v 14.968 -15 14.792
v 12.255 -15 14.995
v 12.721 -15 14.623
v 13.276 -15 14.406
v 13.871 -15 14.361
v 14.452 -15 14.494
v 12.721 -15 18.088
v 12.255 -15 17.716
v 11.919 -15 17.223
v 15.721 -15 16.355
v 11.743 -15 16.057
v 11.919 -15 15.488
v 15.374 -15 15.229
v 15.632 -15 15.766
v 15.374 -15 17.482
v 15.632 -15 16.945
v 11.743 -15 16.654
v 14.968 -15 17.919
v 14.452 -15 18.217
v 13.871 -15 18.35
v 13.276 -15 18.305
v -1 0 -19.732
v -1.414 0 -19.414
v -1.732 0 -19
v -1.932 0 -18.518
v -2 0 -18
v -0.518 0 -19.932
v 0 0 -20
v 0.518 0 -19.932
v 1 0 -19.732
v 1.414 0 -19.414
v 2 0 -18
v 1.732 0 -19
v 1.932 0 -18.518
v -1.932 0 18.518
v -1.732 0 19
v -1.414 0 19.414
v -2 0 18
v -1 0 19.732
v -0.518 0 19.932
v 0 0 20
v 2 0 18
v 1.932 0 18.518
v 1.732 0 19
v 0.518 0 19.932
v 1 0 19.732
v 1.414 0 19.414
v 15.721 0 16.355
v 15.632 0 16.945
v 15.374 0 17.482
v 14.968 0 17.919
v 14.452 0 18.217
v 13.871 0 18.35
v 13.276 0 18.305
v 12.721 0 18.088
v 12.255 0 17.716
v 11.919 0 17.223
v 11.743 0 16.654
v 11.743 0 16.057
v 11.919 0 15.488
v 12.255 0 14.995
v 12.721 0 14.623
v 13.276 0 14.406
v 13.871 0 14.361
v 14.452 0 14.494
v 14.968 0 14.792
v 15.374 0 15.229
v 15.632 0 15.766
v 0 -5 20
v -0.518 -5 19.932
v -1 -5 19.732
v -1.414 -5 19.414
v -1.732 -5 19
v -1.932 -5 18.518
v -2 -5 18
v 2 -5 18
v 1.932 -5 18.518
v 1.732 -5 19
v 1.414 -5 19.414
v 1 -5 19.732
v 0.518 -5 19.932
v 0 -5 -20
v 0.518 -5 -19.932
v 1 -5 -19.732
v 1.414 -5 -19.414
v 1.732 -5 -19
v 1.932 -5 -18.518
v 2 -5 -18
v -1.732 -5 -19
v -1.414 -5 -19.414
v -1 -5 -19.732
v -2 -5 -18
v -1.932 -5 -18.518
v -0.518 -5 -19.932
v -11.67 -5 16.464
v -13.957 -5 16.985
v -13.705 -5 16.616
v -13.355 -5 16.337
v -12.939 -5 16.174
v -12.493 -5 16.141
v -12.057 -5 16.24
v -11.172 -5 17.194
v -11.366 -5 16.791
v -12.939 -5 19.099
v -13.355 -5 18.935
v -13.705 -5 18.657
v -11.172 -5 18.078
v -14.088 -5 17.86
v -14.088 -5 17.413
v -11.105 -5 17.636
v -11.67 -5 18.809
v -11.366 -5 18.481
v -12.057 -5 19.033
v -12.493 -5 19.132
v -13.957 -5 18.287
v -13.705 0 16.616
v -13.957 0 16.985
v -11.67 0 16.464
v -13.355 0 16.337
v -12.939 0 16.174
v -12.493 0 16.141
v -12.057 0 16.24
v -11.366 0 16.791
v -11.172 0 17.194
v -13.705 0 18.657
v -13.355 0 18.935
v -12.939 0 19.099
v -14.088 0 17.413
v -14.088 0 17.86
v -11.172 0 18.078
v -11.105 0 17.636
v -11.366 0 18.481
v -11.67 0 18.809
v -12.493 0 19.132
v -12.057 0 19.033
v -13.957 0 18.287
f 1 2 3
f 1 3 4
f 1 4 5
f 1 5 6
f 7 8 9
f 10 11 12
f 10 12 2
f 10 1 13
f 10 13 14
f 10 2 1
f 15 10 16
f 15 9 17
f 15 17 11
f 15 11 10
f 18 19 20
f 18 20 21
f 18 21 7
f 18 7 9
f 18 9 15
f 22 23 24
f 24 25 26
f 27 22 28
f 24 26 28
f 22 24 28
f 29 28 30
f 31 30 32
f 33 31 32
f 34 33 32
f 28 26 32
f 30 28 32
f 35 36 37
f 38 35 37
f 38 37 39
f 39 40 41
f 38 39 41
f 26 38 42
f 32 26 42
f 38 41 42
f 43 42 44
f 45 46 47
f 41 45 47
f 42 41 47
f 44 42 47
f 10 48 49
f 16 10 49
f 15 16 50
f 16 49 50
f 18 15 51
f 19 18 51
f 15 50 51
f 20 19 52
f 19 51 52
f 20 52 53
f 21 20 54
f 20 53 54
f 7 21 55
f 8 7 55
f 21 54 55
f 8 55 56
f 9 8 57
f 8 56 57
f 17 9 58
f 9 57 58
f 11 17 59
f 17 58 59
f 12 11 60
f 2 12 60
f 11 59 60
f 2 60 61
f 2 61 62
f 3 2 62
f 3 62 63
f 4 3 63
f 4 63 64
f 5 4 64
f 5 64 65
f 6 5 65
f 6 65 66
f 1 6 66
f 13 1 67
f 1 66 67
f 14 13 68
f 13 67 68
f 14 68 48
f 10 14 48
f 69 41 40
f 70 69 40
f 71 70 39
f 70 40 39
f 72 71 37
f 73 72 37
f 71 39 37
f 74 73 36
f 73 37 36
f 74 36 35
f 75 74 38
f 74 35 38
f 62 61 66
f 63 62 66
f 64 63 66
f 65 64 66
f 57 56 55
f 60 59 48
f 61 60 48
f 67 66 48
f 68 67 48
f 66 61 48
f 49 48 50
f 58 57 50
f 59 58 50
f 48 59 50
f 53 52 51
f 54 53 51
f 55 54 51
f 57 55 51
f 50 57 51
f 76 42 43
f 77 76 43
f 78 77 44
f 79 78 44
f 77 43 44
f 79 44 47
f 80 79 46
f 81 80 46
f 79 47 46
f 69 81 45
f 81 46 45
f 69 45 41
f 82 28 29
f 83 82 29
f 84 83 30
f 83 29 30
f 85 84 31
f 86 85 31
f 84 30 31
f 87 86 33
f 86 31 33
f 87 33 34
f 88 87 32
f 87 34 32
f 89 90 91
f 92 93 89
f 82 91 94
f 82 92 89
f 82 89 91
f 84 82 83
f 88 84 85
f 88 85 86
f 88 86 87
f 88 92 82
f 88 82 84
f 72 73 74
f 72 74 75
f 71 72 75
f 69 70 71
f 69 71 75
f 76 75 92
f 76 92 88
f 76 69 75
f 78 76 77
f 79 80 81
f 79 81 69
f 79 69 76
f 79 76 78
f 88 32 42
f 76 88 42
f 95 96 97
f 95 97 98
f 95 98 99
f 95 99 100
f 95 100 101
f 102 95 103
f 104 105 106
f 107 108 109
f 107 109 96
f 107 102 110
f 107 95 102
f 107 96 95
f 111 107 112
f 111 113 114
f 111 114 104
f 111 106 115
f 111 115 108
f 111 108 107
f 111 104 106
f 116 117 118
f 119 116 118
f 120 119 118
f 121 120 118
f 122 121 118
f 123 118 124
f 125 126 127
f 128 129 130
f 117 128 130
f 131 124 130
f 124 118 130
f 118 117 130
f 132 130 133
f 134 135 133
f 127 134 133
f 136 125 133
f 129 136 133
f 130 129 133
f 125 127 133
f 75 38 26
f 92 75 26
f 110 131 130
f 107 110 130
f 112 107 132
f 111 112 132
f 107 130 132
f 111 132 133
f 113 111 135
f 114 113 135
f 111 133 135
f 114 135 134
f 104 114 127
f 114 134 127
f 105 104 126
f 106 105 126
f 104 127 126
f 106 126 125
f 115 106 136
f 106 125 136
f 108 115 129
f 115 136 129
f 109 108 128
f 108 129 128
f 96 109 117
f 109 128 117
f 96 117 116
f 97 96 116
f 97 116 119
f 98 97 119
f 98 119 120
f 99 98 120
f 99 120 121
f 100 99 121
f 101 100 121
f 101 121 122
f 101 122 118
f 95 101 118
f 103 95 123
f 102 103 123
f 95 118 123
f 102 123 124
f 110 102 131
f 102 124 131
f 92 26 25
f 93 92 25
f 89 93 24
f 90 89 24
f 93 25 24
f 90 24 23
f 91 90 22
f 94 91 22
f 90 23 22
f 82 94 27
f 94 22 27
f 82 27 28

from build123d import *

# Parameters (mm, degrees)
F2_R     = 2
F3_DEPTH = 15
F1_R     = 1.5
F4_DEPTH = 5
F5_DEPTH = 5


with BuildPart() as f3:
    # F2 (on Front) → F3 (new body)
    with BuildSketch(Plane.XZ):
        with Locations((13.721123, 16.355488)):
            Circle(F2_R)
    extrude(amount=F3_DEPTH)


with BuildPart() as f4:
    # F1 (on Front) → F4 (new body)
    with BuildSketch(Plane.XZ):
        with Locations((-12.605198, 17.636321)):
            Circle(F1_R)
    extrude(amount=F4_DEPTH)


with BuildPart() as f5:
    # F0 (on Front) → F5 (new body)
    with BuildSketch(Plane.XZ):
        with BuildLine():
            Line((2, -18), (2, 18))
            ThreePointArc((2, 18), (1.414214, 19.414214), (0, 20))
            ThreePointArc((0, 20), (-1.414214, 19.414214), (-2, 18))
            Line((-2, 18), (-2, -18))
            ThreePointArc((-2, -18), (-1.414214, -19.414214), (0, -20))
            ThreePointArc((0, -20), (1.414214, -19.414214), (2, -18))
        make_face()
    extrude(amount=F5_DEPTH)


solid = Compound([f3.part, f4.part, f5.part])
